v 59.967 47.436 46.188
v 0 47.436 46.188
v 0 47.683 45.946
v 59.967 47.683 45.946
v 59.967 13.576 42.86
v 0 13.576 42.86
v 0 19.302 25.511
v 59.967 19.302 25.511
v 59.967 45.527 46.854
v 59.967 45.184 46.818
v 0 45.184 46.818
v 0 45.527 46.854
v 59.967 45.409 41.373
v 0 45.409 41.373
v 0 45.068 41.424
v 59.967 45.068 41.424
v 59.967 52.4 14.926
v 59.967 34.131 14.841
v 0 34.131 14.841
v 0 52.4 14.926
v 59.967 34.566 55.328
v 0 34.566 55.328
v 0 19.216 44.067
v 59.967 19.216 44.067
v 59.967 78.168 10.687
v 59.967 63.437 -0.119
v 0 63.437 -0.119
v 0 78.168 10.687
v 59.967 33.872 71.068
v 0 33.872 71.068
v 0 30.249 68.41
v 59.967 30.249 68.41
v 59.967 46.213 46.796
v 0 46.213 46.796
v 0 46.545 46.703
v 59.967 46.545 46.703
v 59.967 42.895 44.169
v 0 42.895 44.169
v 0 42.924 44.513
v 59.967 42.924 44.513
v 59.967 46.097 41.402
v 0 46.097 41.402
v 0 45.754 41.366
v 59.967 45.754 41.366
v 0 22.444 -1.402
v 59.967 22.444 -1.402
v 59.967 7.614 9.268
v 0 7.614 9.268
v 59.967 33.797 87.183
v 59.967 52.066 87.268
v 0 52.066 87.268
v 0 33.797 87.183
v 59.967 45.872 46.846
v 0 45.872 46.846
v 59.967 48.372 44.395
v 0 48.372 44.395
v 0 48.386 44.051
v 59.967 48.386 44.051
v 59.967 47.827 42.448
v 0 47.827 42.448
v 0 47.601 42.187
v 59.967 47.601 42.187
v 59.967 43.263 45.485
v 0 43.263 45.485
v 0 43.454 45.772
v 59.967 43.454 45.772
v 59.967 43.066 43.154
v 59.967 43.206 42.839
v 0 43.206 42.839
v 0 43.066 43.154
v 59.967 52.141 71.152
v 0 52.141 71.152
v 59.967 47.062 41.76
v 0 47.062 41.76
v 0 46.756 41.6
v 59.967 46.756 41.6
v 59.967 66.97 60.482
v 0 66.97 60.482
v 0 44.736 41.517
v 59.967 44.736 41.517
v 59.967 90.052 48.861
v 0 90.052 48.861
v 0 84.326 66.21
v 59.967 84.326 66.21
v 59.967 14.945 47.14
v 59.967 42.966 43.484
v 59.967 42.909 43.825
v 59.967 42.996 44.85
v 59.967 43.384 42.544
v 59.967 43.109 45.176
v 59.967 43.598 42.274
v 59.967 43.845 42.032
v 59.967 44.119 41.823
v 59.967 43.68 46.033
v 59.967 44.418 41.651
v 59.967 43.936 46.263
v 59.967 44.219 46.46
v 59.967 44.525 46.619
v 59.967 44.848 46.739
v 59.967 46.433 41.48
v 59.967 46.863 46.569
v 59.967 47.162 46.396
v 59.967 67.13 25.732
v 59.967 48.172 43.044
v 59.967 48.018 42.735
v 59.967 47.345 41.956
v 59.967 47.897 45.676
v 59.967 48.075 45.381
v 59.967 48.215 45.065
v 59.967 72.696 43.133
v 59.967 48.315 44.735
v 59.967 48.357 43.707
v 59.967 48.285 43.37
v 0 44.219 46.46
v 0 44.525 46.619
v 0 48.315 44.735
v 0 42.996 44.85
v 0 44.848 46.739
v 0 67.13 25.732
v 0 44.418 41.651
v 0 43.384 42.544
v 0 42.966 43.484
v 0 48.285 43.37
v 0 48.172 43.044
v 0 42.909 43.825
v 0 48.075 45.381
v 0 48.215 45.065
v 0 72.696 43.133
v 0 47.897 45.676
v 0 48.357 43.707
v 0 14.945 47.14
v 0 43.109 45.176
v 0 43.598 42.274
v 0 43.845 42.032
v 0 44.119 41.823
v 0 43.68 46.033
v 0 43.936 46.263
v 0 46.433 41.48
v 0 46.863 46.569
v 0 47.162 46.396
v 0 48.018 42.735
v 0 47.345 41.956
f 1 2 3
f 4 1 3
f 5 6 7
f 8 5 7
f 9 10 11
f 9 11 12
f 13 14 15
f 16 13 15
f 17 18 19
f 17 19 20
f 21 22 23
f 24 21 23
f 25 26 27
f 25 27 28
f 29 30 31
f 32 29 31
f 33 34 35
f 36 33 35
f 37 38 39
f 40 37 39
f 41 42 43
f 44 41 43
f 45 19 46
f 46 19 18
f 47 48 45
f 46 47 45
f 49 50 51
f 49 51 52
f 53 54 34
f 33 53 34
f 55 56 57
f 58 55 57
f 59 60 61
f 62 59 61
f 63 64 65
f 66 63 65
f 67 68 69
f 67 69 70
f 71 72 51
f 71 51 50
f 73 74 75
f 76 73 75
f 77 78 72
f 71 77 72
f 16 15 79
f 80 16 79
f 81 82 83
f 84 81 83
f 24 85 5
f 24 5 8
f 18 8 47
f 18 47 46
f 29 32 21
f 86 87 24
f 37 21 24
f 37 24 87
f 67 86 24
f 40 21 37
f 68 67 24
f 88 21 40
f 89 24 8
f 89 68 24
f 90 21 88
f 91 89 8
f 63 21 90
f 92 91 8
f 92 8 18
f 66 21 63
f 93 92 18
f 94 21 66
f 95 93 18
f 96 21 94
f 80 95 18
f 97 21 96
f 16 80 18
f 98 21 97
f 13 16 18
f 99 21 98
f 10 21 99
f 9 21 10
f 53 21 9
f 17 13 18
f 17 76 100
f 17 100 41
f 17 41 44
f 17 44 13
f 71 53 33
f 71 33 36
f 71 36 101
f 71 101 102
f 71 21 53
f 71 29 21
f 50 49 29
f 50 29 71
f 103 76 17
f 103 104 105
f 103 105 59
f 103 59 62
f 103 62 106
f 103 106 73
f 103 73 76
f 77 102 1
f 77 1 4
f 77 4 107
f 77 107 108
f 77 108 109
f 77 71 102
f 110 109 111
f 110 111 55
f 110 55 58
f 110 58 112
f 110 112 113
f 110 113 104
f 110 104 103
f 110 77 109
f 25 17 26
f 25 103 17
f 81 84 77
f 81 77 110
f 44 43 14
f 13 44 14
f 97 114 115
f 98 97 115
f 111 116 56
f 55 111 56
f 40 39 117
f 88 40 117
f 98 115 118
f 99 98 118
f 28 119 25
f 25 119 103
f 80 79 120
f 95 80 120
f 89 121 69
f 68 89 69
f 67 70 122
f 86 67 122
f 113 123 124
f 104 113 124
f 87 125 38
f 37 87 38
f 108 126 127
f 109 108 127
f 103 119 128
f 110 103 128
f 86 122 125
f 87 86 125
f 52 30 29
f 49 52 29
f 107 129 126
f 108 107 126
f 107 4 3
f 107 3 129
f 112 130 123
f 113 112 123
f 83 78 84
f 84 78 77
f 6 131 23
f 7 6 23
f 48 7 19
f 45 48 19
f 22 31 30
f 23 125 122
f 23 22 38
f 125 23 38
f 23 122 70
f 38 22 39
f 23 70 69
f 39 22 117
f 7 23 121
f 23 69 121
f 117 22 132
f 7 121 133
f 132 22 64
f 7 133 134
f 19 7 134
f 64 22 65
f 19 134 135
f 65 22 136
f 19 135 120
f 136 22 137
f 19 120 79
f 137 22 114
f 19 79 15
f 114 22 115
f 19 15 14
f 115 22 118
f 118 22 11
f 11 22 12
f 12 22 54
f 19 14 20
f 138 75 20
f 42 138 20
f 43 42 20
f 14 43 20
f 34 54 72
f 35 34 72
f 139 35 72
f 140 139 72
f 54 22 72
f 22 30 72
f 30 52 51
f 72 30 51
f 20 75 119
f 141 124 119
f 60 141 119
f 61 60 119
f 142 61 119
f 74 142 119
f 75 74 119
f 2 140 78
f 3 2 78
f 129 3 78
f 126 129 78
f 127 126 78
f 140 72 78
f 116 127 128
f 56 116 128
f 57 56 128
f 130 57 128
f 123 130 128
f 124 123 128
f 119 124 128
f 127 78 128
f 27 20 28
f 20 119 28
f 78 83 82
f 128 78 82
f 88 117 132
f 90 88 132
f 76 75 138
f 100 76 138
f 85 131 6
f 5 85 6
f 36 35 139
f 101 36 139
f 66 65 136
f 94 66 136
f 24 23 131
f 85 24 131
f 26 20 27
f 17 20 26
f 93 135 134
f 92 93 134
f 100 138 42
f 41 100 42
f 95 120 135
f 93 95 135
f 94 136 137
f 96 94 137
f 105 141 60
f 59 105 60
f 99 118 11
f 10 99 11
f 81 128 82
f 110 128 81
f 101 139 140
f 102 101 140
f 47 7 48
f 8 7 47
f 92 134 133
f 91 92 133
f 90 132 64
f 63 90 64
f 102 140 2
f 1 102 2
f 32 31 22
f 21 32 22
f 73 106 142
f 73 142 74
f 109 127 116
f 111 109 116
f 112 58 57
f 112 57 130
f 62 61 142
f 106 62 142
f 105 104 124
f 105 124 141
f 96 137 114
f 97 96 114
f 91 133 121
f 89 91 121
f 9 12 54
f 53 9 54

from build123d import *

# Parameters (mm, degrees)
F1_DEPTH = 59.967
F2_DEPTH = 16.11587
F3_DEPTH = 18.27724
F4_DEPTH = 18.65924
F5_DEPTH = 20.01095


with BuildPart() as f1:
    # F0 (on Right) → F1 (new body)
    with BuildSketch(Plane.YZ):
        Polygon((19.3016365517, 25.5114351168), (34.1311297964, 14.8414346621), (52.4001107586, 14.9257803925), (67.1304496505, 25.7322551057), (72.6956576812, 43.1331527599), (66.9700145375, 60.481921886), (52.1405212928, 71.1519223406), (33.8715403306, 71.0675766103), (30.248601096, 68.4097150693), (34.5660174948, 55.3278902953), (19.2159686951, 44.0667838525), (14.944761002, 47.1399696503), (13.575993408, 42.8602042428), align=None)
        Polygon((43.3843278169, 42.5439793365), (43.2058611327, 42.8390985452), (43.0657899565, 43.1542584575), (42.9663232941, 43.4844888132), (42.9090297944, 43.8245816823), (42.8948130101, 44.1691735971), (42.9238971483, 44.5128301373), (42.9958235348, 44.850131634), (43.1094578475, 45.175758641), (43.2630080055, 45.484575826), (43.454052431, 45.7717129574), (43.6795782392, 46.0326417111), (43.9360287536, 46.2632470849), (44.2193595962, 46.4598922942), (44.5251024704, 46.6194761267), (44.8484356285, 46.7394818499), (45.1842599134, 46.8180169019), (45.5272791756, 46.853842738), (45.8720837963, 46.8463943634), (46.2132360006, 46.7957892434), (46.5453556147, 46.7028254509), (46.8632049136, 46.5689690806), (47.1617712242, 46.3963311273), (47.4363459773, 46.1876341948), (47.6825989651, 45.9461695581), (47.8966466309, 45.6757452591), (48.075113315, 45.3806260503), (48.2151844913, 45.065466138), (48.3146511536, 44.7352357824), (48.3719446533, 44.3951429133), (48.3861614376, 44.0505509984), (48.3570772994, 43.7068944582), (48.2851509129, 43.3695929615), (48.1715166002, 43.0439659545), (48.0179664422, 42.7351487696), (47.8269220168, 42.4480116382), (47.6013962085, 42.1870828844), (47.3449456942, 41.9564775106), (47.0616148515, 41.7598323013), (46.7558719773, 41.6002484689), (46.4325388192, 41.4802427457), (46.0967145343, 41.4017076937), (45.7536952721, 41.3658818576), (45.4088906515, 41.3733302322), (45.0677384471, 41.4239353522), (44.7356188331, 41.5168991446), (44.4177695341, 41.6507555149), (44.1192032235, 41.8233934682), (43.8446284704, 42.0320904008), (43.5983754826, 42.2735550374), align=None, mode=Mode.SUBTRACT)
    extrude(amount=F1_DEPTH)

    # F2 (add): a face of the model
    f2_faces = [f1.faces().sort_by_distance(p)[0] for p in [
        (29.9835, 43.0060308117, 71.1097494755),
    ]]
    extrude(f2_faces, amount=F2_DEPTH)

    # F3 (add): a face of the model
    f3_faces = [f1.faces().sort_by_distance(p)[0] for p in [
        (29.9835, 69.8328361093, 51.8075373229),
    ]]
    extrude(f3_faces, amount=F3_DEPTH)

    # F4 (add): a face of the model
    f4_faces = [f1.faces().sort_by_distance(p)[0] for p in [
        (29.9835, 59.7652802045, 20.3290177491),
    ]]
    extrude(f4_faces, amount=F4_DEPTH)

    # F5 (add): a face of the model
    f5_faces = [f1.faces().sort_by_distance(p)[0] for p in [
        (29.9835, 26.7163831741, 20.1764348894),
    ]]
    extrude(f5_faces, amount=F5_DEPTH)


solid = f1.part
